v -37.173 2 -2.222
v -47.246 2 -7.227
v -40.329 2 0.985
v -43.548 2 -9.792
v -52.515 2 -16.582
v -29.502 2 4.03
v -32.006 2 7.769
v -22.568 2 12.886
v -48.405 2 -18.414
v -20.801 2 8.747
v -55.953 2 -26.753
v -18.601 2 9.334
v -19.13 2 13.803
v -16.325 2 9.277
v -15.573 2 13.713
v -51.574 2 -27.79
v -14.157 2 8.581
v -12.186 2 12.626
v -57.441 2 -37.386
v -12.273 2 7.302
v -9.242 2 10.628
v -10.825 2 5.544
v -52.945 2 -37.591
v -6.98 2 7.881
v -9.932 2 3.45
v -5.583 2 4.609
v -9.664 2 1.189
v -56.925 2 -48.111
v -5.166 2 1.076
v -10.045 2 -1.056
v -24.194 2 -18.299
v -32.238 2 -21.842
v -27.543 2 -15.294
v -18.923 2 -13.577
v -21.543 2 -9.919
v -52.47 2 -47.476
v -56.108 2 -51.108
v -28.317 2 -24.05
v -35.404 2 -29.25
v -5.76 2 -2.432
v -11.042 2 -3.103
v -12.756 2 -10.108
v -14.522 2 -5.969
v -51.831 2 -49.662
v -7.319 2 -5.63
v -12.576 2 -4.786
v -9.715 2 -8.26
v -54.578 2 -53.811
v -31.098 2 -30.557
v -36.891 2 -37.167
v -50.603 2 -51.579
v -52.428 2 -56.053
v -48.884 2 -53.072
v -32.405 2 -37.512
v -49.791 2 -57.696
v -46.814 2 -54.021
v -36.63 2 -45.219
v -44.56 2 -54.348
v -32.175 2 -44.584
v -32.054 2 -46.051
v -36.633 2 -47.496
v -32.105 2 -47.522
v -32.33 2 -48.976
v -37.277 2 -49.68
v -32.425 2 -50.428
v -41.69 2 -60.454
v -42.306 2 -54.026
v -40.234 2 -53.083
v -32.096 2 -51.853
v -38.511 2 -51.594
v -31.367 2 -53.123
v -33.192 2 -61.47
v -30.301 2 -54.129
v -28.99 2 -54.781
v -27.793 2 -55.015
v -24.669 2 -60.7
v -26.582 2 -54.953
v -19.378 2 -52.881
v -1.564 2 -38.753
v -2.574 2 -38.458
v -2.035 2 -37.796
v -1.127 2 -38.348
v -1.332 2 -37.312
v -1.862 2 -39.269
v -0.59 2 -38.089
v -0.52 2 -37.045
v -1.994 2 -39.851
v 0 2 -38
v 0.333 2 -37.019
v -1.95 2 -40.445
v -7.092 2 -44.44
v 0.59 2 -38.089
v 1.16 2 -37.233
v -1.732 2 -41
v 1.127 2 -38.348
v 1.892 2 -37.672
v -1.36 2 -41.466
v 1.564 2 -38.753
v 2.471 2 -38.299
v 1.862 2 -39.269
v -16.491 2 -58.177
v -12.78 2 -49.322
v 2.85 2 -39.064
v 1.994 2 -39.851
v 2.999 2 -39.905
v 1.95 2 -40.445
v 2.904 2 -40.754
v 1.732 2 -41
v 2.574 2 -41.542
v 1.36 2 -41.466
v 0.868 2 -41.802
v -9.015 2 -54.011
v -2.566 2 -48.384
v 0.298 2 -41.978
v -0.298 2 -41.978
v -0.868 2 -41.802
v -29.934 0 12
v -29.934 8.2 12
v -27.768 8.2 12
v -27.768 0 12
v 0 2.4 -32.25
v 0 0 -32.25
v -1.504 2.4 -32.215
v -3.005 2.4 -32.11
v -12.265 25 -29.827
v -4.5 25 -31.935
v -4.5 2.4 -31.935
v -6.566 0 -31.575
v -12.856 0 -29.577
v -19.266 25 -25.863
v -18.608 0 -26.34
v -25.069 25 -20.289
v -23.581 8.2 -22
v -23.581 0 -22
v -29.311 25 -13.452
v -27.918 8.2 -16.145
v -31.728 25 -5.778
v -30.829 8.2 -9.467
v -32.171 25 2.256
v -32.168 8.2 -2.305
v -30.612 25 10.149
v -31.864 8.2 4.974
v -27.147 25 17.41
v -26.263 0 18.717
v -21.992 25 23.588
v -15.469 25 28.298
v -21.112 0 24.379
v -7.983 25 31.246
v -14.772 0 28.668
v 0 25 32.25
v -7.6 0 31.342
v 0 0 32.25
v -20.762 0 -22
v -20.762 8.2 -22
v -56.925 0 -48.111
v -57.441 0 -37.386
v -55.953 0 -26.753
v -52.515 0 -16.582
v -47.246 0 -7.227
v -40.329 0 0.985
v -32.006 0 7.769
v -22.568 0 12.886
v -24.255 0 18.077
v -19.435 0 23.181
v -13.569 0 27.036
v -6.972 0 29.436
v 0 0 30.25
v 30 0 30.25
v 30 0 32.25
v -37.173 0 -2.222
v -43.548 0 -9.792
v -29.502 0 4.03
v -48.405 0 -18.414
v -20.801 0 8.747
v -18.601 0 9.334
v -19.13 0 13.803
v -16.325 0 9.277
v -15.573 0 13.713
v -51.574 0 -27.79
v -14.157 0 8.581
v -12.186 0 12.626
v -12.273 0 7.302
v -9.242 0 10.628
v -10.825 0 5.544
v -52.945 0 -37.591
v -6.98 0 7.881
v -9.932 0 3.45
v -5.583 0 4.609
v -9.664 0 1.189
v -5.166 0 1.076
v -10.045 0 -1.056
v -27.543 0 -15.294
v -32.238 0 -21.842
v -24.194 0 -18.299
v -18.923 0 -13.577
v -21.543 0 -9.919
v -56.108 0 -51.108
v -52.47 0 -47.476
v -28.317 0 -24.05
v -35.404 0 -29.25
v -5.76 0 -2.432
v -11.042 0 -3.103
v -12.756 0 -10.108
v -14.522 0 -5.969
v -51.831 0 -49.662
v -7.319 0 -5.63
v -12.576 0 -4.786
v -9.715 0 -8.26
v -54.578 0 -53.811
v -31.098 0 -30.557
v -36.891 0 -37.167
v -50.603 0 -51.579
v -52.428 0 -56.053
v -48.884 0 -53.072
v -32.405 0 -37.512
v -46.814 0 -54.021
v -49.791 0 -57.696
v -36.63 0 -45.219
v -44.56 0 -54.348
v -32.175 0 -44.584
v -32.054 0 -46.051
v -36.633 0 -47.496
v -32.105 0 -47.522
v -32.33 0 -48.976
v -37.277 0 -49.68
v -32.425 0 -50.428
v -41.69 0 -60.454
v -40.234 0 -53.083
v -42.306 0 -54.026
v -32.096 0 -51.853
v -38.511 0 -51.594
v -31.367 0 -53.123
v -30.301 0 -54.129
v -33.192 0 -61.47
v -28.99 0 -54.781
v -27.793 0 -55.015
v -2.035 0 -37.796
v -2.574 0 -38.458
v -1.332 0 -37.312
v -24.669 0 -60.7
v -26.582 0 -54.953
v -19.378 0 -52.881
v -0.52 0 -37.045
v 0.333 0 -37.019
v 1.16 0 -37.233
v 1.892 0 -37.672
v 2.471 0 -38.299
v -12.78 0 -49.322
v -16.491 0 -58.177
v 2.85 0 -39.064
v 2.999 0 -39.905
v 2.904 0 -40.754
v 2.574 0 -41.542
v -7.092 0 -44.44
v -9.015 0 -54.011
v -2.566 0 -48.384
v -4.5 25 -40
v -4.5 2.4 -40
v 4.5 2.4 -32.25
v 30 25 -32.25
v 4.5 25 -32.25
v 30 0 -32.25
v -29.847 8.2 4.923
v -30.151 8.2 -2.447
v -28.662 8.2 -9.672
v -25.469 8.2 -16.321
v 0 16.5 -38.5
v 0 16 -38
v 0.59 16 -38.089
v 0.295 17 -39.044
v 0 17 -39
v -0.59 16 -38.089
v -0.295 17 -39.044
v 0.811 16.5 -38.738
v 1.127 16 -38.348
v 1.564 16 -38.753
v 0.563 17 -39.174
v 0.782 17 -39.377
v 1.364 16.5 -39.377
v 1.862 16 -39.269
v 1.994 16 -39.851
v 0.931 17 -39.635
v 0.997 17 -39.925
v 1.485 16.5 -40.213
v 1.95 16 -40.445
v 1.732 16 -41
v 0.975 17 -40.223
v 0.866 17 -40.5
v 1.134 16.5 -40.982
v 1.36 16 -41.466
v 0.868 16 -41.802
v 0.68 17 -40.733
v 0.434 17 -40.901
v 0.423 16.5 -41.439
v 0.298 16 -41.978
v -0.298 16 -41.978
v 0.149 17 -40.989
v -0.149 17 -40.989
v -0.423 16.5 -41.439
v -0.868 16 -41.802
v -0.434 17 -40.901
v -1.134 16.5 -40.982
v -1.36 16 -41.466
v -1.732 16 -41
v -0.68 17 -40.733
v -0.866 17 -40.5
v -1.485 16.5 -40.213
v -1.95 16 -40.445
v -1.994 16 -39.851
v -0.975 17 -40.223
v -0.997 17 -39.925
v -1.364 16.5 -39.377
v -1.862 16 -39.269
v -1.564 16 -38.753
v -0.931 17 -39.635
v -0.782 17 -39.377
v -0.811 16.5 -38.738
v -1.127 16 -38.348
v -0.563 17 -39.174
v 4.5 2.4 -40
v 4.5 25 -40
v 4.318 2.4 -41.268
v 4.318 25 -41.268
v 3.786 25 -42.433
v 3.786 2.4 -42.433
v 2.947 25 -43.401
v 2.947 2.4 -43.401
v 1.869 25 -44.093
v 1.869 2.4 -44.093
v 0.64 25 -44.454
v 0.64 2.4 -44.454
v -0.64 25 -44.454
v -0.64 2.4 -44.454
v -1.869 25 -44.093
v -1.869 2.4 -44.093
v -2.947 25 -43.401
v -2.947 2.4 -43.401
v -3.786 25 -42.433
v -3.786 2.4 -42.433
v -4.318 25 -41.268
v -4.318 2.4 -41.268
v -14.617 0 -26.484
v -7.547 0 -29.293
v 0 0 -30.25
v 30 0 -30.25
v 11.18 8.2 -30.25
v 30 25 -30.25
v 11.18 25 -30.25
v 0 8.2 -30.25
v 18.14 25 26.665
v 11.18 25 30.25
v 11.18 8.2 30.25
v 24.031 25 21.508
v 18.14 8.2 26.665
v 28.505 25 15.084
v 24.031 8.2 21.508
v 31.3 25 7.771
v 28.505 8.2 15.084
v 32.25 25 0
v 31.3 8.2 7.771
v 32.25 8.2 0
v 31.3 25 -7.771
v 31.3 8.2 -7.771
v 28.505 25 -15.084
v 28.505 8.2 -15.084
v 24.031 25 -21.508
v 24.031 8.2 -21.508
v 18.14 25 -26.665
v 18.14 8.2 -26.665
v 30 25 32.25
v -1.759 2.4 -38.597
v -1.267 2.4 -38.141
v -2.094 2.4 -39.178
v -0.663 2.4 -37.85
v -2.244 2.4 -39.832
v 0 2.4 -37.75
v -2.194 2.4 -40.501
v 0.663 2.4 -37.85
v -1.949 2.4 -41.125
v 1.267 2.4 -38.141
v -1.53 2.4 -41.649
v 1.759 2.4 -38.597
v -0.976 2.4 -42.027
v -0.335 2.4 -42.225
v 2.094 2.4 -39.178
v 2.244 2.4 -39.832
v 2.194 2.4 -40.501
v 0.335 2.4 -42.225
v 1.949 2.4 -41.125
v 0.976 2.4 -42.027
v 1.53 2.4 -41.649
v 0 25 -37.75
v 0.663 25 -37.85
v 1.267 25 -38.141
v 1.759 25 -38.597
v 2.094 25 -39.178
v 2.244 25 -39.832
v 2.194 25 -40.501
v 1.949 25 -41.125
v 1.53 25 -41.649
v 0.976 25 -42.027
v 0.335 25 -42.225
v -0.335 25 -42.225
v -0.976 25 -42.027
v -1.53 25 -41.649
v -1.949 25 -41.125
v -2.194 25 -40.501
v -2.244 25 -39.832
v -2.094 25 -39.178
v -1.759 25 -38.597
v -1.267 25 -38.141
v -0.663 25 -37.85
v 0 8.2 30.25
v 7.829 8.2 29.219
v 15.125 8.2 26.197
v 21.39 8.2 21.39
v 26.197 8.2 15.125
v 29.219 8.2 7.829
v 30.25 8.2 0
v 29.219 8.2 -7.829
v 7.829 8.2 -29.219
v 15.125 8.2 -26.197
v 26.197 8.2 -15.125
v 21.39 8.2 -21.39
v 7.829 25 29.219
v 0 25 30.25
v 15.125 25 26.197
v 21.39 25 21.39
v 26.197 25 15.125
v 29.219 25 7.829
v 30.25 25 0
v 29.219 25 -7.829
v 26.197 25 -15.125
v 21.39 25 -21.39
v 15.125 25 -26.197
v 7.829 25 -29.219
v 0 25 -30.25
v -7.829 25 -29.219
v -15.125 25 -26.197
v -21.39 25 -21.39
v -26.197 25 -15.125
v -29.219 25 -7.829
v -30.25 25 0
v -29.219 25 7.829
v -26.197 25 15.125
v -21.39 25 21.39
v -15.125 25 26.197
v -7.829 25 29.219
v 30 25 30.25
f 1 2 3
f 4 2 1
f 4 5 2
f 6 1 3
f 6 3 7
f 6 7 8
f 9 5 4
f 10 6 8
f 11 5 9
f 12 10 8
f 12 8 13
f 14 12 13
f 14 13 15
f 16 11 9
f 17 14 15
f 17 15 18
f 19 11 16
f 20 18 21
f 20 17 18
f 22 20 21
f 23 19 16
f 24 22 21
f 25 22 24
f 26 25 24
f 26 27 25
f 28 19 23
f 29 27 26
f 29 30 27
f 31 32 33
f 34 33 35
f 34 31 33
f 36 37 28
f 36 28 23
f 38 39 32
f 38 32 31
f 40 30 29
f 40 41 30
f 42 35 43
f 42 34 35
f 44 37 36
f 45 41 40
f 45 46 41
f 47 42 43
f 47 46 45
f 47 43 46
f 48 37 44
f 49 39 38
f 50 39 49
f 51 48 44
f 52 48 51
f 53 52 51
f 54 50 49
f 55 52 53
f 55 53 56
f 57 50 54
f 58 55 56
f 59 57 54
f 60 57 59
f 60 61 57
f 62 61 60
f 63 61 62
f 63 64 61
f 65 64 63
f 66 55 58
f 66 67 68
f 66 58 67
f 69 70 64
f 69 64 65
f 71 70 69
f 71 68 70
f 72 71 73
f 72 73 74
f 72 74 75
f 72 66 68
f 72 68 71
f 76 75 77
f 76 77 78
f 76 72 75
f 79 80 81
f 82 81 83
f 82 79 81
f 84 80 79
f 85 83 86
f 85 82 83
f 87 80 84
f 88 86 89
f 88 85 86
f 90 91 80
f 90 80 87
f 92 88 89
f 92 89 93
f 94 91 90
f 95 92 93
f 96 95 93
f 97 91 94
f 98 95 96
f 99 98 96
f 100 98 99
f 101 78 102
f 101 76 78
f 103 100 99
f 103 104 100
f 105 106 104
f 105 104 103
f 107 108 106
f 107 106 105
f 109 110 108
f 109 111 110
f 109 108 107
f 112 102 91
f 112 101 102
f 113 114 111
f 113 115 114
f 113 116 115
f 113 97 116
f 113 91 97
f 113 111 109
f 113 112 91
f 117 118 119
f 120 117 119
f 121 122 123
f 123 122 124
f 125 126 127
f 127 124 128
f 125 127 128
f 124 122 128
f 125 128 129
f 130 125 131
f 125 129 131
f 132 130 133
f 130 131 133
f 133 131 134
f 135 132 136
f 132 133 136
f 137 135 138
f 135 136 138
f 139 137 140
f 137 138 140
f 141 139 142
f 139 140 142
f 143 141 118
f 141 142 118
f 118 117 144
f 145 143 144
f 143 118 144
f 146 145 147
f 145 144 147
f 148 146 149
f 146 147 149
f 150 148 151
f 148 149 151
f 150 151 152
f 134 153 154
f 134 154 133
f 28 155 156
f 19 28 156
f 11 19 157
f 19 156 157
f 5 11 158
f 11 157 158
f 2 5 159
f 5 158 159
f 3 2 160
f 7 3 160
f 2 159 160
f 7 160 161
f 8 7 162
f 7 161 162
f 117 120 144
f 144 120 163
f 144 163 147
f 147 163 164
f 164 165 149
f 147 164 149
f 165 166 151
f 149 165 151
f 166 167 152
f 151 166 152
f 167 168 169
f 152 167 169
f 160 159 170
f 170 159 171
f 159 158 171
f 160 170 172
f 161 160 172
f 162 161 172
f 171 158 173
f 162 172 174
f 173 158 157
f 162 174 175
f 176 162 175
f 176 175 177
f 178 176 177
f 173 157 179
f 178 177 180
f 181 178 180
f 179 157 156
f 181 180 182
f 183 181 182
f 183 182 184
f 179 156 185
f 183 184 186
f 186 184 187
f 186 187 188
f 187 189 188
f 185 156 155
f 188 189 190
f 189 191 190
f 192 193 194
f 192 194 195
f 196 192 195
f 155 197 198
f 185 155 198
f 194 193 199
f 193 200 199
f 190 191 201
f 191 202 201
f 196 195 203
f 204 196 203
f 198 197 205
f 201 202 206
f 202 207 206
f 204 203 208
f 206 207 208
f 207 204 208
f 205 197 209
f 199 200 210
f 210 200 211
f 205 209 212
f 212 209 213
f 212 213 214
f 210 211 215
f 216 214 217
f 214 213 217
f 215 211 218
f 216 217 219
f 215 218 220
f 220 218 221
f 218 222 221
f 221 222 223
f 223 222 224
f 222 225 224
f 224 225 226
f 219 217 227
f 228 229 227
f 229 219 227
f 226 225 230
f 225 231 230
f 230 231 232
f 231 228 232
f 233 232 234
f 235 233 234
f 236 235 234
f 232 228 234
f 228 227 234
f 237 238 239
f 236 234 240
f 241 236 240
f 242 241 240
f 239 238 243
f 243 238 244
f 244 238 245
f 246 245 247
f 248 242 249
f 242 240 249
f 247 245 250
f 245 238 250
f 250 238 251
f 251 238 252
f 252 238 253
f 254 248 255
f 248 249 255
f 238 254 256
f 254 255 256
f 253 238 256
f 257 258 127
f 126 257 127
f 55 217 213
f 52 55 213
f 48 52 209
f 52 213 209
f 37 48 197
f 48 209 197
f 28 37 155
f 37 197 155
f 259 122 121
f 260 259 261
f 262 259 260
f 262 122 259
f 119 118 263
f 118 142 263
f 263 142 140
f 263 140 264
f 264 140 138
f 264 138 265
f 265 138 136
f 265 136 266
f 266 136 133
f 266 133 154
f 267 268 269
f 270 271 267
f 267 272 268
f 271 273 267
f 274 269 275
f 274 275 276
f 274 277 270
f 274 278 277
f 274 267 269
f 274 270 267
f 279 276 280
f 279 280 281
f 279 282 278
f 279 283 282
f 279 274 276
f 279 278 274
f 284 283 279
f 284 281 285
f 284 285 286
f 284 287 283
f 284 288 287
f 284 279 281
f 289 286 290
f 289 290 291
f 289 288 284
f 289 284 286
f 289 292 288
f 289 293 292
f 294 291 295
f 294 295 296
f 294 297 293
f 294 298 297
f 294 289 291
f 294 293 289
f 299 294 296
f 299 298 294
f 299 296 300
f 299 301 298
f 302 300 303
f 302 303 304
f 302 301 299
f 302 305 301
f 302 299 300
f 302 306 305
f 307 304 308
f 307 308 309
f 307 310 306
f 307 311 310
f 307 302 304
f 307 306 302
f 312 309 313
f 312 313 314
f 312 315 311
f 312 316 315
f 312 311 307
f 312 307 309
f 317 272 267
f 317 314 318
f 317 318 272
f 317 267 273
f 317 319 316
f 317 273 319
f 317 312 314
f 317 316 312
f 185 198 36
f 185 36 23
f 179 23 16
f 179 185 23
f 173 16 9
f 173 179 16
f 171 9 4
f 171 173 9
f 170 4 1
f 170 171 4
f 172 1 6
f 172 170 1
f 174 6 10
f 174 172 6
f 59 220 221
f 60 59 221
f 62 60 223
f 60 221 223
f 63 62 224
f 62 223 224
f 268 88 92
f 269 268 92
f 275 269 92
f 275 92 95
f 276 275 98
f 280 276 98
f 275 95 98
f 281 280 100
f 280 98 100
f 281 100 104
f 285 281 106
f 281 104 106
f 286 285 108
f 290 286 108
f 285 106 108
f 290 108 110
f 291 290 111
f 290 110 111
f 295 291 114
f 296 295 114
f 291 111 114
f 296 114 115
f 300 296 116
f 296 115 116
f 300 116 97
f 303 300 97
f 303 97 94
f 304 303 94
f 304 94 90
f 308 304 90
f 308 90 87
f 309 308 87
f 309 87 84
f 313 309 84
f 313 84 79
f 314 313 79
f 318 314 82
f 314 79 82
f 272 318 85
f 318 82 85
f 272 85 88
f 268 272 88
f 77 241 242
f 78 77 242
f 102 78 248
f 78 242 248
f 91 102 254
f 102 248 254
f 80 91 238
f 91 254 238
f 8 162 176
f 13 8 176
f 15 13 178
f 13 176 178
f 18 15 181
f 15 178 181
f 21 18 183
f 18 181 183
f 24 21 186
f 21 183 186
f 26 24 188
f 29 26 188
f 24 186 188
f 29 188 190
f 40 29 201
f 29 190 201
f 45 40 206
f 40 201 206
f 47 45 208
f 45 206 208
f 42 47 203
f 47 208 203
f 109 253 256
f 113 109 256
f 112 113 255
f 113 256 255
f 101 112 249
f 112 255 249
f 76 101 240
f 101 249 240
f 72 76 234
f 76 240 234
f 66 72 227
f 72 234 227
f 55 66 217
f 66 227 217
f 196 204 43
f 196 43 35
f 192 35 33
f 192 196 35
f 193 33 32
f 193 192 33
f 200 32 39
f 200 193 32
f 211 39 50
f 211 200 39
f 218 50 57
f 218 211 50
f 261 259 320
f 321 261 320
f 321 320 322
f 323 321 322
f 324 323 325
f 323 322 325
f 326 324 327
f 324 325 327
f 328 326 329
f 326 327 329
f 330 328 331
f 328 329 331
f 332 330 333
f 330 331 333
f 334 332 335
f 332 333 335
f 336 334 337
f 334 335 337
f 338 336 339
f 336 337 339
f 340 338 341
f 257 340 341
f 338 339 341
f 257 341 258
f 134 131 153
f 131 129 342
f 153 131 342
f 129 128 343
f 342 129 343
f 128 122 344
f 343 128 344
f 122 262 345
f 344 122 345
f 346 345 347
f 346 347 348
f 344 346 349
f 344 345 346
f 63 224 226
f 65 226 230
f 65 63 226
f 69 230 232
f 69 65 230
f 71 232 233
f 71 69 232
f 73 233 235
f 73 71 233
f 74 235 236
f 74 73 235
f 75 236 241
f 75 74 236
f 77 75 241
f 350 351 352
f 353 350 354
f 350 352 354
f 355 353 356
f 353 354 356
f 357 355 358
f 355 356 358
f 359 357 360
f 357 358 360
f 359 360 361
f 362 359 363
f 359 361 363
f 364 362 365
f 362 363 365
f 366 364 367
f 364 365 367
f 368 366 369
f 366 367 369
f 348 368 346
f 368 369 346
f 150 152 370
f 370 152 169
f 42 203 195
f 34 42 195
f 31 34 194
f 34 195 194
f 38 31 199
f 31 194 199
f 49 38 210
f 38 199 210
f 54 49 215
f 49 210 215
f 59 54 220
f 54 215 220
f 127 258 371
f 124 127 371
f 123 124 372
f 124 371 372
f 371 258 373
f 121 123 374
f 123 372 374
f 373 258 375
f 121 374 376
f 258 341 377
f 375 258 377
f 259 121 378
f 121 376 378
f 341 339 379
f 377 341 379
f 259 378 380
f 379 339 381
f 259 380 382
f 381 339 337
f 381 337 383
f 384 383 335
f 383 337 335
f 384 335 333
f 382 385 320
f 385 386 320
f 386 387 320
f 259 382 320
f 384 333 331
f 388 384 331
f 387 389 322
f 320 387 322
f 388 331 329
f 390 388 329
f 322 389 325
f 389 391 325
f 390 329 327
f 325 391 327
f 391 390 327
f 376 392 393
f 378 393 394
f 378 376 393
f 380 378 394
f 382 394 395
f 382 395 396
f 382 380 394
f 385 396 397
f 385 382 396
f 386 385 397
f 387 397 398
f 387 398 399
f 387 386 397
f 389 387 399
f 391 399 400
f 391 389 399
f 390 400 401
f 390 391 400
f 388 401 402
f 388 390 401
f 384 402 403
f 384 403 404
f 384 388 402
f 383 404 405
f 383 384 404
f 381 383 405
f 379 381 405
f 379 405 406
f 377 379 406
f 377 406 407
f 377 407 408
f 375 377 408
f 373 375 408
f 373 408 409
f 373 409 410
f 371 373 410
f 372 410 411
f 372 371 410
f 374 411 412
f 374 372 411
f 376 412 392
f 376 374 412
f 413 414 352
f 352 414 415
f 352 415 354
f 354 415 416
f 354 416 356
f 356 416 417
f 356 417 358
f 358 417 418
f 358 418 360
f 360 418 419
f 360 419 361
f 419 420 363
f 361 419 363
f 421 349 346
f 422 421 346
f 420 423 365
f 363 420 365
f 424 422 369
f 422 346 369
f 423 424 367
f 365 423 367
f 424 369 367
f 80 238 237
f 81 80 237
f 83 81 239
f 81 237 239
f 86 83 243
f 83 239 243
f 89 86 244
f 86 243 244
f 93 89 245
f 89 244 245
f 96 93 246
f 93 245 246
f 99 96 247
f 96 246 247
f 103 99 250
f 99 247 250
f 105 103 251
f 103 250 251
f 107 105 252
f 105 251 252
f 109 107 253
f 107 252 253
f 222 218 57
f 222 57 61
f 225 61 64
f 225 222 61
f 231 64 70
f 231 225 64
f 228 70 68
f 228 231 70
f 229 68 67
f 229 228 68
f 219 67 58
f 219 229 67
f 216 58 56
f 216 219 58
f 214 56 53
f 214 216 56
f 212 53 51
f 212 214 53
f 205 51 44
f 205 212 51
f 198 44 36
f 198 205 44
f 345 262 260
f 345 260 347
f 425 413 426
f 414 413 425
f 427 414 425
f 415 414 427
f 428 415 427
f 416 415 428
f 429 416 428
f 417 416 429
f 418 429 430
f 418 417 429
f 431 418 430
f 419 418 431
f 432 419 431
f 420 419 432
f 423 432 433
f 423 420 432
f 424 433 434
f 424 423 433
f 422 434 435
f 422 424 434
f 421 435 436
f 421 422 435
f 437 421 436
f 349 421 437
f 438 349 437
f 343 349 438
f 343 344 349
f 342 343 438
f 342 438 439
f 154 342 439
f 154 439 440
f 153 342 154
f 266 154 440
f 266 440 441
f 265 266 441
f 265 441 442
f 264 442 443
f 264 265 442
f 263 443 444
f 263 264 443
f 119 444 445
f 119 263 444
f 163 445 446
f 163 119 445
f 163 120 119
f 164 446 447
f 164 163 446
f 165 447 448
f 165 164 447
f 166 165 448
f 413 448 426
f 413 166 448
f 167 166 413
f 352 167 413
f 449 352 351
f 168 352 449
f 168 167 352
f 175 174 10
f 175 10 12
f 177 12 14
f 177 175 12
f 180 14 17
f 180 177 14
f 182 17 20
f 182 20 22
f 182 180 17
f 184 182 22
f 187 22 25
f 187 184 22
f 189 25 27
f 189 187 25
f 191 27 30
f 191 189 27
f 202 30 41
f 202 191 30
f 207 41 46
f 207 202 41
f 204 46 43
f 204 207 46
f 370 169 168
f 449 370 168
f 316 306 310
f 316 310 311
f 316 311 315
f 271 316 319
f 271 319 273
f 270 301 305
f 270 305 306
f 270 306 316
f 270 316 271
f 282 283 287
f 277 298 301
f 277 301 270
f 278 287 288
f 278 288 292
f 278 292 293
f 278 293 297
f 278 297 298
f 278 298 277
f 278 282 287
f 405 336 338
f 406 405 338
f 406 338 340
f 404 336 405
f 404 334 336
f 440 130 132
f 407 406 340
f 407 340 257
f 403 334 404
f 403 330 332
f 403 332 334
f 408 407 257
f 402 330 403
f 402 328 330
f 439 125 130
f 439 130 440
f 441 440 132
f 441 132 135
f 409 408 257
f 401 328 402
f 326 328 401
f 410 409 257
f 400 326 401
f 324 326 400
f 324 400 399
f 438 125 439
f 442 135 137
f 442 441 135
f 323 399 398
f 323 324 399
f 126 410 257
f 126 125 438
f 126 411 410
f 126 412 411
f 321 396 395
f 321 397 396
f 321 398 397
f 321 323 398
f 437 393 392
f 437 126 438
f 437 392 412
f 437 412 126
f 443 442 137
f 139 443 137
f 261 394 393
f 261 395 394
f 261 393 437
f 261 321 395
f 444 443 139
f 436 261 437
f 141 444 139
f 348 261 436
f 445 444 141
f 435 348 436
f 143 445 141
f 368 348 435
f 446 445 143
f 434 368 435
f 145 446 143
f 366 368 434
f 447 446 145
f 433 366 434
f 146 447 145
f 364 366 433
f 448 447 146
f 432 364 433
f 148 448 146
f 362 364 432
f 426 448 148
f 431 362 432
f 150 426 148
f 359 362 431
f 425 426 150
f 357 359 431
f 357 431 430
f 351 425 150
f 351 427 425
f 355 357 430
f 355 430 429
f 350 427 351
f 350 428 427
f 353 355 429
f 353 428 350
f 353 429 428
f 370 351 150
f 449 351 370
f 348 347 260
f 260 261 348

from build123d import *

# Parameters (mm, degrees)
SKETCH1_R           = 32.25
SKETCH1_R_2         = 30.25
BOSS_EXTRUDE1_DEPTH = 25
CUT_EXTRUDE1_DEPTH  = 8.2
BOSS_EXTRUDE2_DEPTH = 2
FILLET1_R           = 5
SKETCH4_R           = 2
BOSS_EXTRUDE3_DEPTH = 15
CHAMFER1_SIZE       = 1
BOSS_EXTRUDE4_START = -22.6
SKETCH5_R           = 2.25
BOSS_EXTRUDE4_DEPTH = 22.6
SKETCH6_W           = 30
SKETCH6_H           = 2
BOSS_EXTRUDE5_DEPTH = 25


with BuildPart() as part:
    # Sketch1 → Boss-Extrude1 (new body)
    with BuildSketch(Plane(origin=(0, 0, 0), x_dir=(1, 0, 0), z_dir=(0, 1, 0))):
        with Locations(Location((0, 0, 0), (0, 0, 270))):
            Circle(SKETCH1_R)
        with Locations(Location((0, 0, 0), (0, 0, 270))):
            Circle(SKETCH1_R_2, mode=Mode.SUBTRACT)
    extrude(amount=BOSS_EXTRUDE1_DEPTH)

    # Sketch2 → Cut-Extrude1 (cut)
    with BuildSketch(Plane(origin=(0, 0, 0), x_dir=(1, 0, 0), z_dir=(0, 1, 0))):
        Polygon((0, -12), (0, -30.25), (38.638720052, -30.25), (38.638720052, 30.25), (0, 30.25), (0, 22), (-36.204186746, 22), (-36.204186746, -12), align=None)
    extrude(amount=CUT_EXTRUDE1_DEPTH, mode=Mode.SUBTRACT)

    # Sketch5 → Boss-Extrude4 (add)
    with BuildSketch(Plane(origin=(0, 25, 0), x_dir=(1, 0, 0), z_dir=(0, 1, 0)).offset(BOSS_EXTRUDE4_START)):
        with BuildLine():
            Line((-4.5, 40), (-4.5, 31.934503284))
            ThreePointArc((-4.5, 31.934503284), (0, 32.25), (4.5, 31.934503284))
            Line((4.5, 31.934503284), (4.5, 40))
            ThreePointArc((4.5, 40), (0, 44.5), (-4.5, 40))
        make_face()
        with Locations(Location((0, 40, 0), (0, 0, 270))):
            Circle(SKETCH5_R, mode=Mode.SUBTRACT)
    extrude(amount=BOSS_EXTRUDE4_DEPTH)

    # Sketch6 → Boss-Extrude5 (add)
    with BuildSketch(Plane.XZ):
        with Locations((15, -31.25)):
            Rectangle(SKETCH6_W, SKETCH6_H)
    boss_extrude5 = extrude(amount=-BOSS_EXTRUDE5_DEPTH)

    # Mirror1: Boss-Extrude5 across plane
    add(boss_extrude5.mirror(Plane.XY))


with BuildPart() as body_2:
    # Sketch3 → Boss-Extrude2 (new body)
    with BuildSketch(Plane(origin=(0, 0, 0), x_dir=(1, 0, 0), z_dir=(0, 1, 0))):
        with BuildLine():
            ThreePointArc((-56.925093776, 48.110715046), (-50.099203776, 11.78086144), (-22.567647546, -12.886210719))
            ThreePointArc((-22.567647546, -12.886210719), (-6.16463488, -6.295218725), (-12.755626874, 10.107793941))
            ThreePointArc((-12.755626874, 10.107793941), (-28.316941264, 24.050052118), (-32.175053004, 44.5843172))
            ThreePointArc((-32.175053004, 44.5843172), (-32.723387933, 50.394676991), (-35.84982313, 55.322795807))
            ThreePointArc((-35.84982313, 55.322795807), (-16.777592276, 51.693621977), (-2.57365586, 38.458476237))
            ThreePointArc((-2.57365586, 38.458476237), (1.541523763, 37.42634414), (2.57365586, 41.541523763))
            ThreePointArc((2.57365586, 41.541523763), (-20.513652026, 59.652200656), (-49.791491149, 57.695535328))
            ThreePointArc((-49.791491149, 57.695535328), (-54.577631328, 53.810630876), (-56.925093776, 48.110715046))
        make_face()
        with BuildLine():
            ThreePointArc((-52.470086437, 47.475963434), (-46.178396524, 13.989315762), (-20.801483825, -8.74728988))
            ThreePointArc((-20.801483825, -8.74728988), (-10.303555719, -4.529055004), (-14.521790595, 5.968873102))
            ThreePointArc((-14.521790595, 5.968873102), (-32.237748516, 21.841597796), (-36.630060343, 45.219068812))
            ThreePointArc((-36.630060343, 45.219068812), (-43.421626079, 54.26752917), (-52.470086437, 47.475963434))
        make_face(mode=Mode.SUBTRACT)
    extrude(amount=BOSS_EXTRUDE2_DEPTH)

    # Fillet1
    fillet1_edges = [body_2.edges().sort_by_distance(p)[0] for p in [
        (-35.84982313, 1, -55.322795807),
    ]]
    fillet(fillet1_edges, radius=FILLET1_R)

    # Sketch4 → Boss-Extrude3 (add)
    with BuildSketch(Plane(origin=(0, 2, 0), x_dir=(1, 0, 0), z_dir=(0, 1, 0))):
        with Locations(Location((0, 40, 0), (0, 0, 270))):
            Circle(SKETCH4_R)
    extrude(amount=BOSS_EXTRUDE3_DEPTH)

    # Chamfer1
    chamfer1_edges = [body_2.edges().sort_by_distance(p)[0] for p in [
        (0, 17, -42),
    ]]
    chamfer(chamfer1_edges, length=CHAMFER1_SIZE)


solid = Compound([part.part, body_2.part])
